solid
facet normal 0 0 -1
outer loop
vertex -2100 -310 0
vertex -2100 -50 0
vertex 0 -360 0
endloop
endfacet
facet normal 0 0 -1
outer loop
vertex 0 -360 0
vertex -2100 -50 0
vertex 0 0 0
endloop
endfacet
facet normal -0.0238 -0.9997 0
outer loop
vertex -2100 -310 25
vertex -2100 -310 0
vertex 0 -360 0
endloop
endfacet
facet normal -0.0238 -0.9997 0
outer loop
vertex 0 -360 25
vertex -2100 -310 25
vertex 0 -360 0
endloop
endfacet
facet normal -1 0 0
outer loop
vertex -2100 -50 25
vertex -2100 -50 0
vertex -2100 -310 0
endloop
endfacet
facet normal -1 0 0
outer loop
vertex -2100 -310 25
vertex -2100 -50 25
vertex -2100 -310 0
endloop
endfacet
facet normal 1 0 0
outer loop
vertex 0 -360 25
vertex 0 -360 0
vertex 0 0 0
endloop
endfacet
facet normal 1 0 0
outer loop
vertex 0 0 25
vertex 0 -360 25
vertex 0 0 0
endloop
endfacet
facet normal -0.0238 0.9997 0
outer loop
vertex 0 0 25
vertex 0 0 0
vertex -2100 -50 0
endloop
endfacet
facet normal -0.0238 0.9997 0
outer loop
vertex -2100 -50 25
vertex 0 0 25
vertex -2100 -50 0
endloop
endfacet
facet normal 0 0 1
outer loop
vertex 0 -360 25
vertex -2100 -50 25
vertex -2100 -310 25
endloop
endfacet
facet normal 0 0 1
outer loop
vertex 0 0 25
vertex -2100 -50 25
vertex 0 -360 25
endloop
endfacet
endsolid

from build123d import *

# Parameters (mm, degrees)
F1_DEPTH = 25


with BuildPart() as f1:
    # F0 (on Top) → F1 (new body)
    with BuildSketch(Plane.XY):
        Polygon((0, -360), (0, 0), (-2100, -50), (-2100, -310), align=None)
    extrude(amount=F1_DEPTH)


with BuildPart() as f3:
    # F2 (on face) → F3 (revolve)
    with BuildSketch(Plane.XY.offset(25)):
        Polygon((0, 0), (0, -360), (32.8437872231, -908.5312581062), (103.8437858224, -1328.6146020889), (234.0103685856, -1328.6146020889), (193.9810067415, 1467.5388336182), (68.257547915, 1411.1691713333), (-87.2723832726, 1199.2609500885), (-128.0860751867, 896.1502313614), (-80.0736993551, 367.2015070915), align=None)
    revolve(axis=Axis((213.9956876636, 69.4621157646, 25), (-0.0143144007, 0.9998975437, 0)))


solid = f1.part
